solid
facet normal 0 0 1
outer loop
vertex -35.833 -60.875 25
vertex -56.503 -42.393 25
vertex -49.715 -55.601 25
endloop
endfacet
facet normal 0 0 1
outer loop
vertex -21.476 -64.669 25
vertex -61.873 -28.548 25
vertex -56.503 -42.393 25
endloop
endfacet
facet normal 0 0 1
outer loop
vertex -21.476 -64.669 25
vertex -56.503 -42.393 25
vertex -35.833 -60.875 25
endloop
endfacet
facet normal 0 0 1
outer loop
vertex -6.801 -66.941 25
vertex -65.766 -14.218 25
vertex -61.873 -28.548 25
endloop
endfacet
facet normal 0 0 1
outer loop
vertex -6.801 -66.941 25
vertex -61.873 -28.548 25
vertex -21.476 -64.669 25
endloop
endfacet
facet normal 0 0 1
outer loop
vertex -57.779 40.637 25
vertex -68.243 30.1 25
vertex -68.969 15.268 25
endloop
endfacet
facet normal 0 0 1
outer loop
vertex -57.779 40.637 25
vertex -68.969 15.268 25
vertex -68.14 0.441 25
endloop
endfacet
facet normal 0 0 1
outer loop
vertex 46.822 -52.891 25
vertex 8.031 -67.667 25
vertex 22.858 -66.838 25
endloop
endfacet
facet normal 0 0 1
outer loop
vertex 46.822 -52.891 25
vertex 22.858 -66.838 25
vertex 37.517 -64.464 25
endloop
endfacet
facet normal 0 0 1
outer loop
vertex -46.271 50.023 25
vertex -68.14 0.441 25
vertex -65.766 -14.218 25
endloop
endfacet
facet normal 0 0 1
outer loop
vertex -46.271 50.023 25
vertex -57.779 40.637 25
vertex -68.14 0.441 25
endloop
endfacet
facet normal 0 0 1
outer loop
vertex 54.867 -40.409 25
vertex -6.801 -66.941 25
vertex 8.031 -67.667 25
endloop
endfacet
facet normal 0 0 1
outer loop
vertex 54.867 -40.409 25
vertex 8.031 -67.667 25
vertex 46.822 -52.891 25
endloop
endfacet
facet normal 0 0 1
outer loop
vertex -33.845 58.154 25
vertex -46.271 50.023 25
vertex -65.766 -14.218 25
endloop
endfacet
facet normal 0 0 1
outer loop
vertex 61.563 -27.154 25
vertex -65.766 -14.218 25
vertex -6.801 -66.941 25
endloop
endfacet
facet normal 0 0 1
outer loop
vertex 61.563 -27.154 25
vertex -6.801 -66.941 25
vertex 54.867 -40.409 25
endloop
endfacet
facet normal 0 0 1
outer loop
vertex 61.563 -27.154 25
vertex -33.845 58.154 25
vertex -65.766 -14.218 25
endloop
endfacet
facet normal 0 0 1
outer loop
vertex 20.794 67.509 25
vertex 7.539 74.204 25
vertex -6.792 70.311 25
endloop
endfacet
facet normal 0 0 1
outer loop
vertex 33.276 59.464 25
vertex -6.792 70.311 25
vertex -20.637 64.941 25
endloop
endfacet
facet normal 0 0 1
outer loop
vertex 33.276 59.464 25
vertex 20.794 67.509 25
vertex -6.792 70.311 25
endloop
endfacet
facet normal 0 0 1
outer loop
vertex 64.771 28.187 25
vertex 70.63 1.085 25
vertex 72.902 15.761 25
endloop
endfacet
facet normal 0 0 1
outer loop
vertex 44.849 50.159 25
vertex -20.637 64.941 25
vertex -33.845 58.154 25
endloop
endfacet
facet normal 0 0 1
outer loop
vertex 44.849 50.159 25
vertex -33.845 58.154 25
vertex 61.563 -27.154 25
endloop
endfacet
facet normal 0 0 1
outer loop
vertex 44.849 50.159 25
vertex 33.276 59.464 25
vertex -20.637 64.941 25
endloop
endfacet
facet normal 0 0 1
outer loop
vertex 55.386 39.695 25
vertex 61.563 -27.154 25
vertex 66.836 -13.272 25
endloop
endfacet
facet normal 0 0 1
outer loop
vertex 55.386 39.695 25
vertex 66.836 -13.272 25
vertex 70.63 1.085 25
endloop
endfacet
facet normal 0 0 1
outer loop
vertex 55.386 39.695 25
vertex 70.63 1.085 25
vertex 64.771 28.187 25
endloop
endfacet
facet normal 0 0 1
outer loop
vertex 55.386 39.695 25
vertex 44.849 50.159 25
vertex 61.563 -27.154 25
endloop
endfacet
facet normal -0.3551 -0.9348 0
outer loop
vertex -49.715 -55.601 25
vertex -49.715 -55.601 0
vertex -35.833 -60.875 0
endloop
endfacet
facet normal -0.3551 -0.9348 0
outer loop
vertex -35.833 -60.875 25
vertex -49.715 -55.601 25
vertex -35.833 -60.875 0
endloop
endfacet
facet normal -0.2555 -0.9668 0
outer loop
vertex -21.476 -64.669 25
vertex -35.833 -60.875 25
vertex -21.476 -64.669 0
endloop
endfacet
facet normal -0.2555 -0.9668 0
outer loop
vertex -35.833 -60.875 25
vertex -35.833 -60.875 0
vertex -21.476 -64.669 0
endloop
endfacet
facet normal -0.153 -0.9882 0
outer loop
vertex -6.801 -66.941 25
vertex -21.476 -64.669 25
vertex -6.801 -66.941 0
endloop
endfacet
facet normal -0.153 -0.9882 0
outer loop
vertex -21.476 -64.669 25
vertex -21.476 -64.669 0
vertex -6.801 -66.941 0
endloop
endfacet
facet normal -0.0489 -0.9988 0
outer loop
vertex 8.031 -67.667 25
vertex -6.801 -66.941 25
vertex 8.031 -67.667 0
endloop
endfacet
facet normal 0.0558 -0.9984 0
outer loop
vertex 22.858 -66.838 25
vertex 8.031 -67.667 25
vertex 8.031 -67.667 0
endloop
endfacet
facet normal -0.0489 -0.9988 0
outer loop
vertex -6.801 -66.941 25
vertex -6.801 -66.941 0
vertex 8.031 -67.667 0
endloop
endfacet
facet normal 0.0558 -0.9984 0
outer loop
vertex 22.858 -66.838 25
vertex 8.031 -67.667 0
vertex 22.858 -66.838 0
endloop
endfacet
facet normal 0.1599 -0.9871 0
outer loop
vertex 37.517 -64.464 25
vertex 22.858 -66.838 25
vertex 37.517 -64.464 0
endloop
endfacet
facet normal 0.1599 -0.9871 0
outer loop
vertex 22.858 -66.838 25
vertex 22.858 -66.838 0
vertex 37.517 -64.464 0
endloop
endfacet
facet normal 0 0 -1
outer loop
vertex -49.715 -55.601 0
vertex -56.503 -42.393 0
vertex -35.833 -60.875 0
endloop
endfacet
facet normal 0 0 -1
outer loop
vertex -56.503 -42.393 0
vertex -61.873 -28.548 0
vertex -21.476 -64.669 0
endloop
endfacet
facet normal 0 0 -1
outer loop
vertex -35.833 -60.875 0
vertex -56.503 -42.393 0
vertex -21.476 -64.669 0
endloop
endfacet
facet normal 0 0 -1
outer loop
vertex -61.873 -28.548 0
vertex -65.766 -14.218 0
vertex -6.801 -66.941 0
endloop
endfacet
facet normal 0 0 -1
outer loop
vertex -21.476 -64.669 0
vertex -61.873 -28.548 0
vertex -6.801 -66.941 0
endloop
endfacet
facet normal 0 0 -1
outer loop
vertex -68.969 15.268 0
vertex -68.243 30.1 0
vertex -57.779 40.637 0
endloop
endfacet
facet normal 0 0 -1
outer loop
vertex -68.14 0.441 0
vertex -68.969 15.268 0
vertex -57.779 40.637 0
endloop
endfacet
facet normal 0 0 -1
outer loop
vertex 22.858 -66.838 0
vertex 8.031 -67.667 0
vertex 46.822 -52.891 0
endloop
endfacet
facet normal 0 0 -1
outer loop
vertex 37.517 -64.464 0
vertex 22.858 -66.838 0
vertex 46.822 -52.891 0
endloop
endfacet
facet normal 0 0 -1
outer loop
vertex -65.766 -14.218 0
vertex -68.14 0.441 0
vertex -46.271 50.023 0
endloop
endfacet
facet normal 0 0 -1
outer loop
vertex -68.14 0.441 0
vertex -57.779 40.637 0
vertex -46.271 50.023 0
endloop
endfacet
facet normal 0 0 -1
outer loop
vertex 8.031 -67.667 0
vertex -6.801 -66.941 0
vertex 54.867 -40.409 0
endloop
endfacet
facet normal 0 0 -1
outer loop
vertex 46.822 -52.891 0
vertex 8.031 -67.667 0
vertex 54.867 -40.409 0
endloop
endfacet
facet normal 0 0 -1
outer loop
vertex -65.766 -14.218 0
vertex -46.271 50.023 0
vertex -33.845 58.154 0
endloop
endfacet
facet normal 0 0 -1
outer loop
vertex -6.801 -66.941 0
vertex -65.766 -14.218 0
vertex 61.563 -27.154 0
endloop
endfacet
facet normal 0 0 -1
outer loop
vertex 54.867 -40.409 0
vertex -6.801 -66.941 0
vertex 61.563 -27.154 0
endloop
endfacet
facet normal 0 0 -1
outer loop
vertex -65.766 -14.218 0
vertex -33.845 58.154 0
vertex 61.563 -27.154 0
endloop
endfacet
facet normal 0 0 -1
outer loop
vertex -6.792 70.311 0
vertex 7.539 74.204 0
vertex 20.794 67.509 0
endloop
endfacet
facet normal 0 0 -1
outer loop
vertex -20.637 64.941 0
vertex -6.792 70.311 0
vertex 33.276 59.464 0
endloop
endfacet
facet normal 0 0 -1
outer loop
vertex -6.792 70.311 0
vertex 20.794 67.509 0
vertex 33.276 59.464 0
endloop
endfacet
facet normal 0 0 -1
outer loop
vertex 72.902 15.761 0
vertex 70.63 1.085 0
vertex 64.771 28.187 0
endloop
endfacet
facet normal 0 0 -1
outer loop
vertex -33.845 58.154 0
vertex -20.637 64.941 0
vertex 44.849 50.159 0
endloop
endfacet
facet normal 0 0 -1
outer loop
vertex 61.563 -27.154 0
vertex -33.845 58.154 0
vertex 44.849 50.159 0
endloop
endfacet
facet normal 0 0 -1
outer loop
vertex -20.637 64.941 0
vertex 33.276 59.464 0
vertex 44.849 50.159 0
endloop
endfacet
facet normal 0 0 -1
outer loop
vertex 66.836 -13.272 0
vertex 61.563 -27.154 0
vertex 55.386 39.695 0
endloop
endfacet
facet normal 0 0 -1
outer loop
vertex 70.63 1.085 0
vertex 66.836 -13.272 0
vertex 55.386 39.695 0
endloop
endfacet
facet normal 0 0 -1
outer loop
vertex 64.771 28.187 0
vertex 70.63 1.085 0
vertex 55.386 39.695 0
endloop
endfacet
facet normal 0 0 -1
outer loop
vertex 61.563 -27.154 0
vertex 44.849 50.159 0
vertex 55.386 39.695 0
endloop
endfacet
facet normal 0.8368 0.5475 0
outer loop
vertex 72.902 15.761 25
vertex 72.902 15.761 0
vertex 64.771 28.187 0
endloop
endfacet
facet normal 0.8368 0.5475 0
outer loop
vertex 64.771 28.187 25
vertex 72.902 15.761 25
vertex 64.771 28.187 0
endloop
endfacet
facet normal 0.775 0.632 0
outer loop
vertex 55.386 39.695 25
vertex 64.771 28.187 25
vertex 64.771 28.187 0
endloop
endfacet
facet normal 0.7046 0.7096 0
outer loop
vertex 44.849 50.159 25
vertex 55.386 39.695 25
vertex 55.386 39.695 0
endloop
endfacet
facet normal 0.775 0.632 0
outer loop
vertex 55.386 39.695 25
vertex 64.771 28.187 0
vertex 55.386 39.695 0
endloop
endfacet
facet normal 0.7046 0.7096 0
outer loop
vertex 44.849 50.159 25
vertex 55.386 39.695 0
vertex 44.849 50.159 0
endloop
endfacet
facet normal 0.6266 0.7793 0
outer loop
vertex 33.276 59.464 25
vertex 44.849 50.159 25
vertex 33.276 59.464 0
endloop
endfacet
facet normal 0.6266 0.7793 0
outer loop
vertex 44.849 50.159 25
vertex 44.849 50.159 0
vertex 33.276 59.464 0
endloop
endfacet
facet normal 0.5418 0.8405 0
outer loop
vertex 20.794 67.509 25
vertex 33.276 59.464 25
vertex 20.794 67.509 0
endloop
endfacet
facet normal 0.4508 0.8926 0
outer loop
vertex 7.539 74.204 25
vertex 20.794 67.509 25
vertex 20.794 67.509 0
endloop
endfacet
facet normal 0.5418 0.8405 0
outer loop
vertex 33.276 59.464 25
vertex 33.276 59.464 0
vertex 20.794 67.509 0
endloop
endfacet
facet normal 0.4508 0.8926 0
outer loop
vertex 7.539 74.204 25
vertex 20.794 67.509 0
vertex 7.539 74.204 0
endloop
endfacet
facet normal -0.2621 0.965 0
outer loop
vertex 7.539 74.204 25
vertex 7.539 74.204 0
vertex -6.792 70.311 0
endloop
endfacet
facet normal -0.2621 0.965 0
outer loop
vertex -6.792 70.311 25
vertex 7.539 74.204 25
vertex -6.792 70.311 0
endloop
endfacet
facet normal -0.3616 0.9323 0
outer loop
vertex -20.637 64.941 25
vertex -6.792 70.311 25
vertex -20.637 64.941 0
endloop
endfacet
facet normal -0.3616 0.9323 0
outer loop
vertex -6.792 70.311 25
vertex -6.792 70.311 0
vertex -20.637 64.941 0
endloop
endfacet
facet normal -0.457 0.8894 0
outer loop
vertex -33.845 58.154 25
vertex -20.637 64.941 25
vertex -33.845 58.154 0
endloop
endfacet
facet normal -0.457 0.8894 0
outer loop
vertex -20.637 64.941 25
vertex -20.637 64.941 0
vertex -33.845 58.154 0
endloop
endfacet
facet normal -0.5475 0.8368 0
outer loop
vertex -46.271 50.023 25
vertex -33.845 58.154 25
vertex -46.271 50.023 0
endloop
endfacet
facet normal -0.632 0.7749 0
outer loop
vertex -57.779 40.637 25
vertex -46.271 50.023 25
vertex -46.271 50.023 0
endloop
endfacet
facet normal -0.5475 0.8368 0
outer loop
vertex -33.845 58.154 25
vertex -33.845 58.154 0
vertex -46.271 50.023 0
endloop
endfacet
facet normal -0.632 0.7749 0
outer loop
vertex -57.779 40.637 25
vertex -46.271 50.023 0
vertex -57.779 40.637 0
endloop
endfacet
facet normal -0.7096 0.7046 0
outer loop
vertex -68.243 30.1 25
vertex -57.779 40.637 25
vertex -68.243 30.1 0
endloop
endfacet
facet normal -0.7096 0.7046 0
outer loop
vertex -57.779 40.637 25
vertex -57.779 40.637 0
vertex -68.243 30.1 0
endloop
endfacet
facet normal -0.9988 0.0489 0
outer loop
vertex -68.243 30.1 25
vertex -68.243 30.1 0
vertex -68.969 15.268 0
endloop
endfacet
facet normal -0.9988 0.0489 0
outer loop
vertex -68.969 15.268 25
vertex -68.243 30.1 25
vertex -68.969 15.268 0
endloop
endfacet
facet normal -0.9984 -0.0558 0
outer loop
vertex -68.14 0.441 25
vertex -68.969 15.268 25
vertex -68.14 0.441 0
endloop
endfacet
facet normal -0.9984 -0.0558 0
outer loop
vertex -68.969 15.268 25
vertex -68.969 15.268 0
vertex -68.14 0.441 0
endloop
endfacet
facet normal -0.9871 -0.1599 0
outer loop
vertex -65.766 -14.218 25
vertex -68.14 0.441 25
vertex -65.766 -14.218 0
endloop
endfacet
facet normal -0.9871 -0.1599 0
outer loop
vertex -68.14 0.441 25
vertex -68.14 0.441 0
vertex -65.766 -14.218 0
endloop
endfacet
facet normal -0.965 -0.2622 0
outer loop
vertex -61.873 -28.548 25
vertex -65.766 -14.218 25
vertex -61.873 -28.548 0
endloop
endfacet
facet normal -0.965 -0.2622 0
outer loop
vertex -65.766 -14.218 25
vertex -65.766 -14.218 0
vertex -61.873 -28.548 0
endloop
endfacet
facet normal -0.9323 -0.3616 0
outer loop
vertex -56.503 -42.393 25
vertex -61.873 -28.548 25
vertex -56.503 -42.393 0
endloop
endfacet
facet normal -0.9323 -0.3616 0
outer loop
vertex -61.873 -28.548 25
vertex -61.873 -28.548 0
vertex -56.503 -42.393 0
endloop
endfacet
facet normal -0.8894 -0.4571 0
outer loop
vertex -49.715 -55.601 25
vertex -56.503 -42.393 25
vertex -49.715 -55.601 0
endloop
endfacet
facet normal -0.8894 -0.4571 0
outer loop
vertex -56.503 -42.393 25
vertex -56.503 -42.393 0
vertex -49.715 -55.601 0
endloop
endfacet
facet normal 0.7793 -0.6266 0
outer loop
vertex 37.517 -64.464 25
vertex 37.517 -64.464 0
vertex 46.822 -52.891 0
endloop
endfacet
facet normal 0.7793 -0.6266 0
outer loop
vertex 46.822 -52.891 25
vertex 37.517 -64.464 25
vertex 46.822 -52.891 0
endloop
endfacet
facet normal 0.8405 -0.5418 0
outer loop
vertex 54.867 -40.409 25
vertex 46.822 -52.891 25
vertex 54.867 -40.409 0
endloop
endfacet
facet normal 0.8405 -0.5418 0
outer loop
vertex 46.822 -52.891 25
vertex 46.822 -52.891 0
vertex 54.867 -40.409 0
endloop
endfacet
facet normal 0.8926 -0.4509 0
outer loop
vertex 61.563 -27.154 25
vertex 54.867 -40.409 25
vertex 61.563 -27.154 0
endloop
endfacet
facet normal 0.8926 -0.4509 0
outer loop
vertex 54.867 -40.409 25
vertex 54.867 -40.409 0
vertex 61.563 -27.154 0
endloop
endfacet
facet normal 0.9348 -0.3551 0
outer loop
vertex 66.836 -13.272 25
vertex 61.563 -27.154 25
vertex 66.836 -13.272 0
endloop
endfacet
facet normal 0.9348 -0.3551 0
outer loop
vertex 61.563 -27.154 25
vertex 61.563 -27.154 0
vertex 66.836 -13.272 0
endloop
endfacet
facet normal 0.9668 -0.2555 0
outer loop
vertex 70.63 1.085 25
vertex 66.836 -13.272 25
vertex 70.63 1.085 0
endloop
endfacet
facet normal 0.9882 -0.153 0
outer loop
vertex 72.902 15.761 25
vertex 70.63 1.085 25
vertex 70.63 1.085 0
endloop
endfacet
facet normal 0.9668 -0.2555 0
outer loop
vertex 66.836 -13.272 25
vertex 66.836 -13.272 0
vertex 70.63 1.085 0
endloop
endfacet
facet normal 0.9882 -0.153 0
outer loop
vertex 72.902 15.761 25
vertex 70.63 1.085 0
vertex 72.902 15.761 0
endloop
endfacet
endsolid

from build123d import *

# Parameters (mm, degrees)
F1_DEPTH = 25


with BuildPart() as f1:
    # F0 (on Top) → F1 (new body)
    with BuildSketch(Plane.XY):
        with BuildLine():
            ThreePointArc((-49.715382543, -55.6013963989), (-6.8009476536, -66.9407953487), (37.5171722726, -64.4639149259))
            ThreePointArc((37.5171722726, -64.4639149259), (61.5628712195, -27.1539289627), (72.9022701693, 15.7605059268))
            ThreePointArc((72.9022701693, 15.7605059268), (44.8488945123, 50.1587443216), (7.5389085491, 74.2044432685))
            ThreePointArc((7.5389085491, 74.2044432685), (-33.844730053, 58.1537377864), (-68.2429684479, 30.1003621294))
            ThreePointArc((-68.2429684479, 30.1003621294), (-65.7660880251, -14.2177577968), (-49.715382543, -55.6013963989))
        make_face()
    extrude(amount=F1_DEPTH)


solid = f1.part
